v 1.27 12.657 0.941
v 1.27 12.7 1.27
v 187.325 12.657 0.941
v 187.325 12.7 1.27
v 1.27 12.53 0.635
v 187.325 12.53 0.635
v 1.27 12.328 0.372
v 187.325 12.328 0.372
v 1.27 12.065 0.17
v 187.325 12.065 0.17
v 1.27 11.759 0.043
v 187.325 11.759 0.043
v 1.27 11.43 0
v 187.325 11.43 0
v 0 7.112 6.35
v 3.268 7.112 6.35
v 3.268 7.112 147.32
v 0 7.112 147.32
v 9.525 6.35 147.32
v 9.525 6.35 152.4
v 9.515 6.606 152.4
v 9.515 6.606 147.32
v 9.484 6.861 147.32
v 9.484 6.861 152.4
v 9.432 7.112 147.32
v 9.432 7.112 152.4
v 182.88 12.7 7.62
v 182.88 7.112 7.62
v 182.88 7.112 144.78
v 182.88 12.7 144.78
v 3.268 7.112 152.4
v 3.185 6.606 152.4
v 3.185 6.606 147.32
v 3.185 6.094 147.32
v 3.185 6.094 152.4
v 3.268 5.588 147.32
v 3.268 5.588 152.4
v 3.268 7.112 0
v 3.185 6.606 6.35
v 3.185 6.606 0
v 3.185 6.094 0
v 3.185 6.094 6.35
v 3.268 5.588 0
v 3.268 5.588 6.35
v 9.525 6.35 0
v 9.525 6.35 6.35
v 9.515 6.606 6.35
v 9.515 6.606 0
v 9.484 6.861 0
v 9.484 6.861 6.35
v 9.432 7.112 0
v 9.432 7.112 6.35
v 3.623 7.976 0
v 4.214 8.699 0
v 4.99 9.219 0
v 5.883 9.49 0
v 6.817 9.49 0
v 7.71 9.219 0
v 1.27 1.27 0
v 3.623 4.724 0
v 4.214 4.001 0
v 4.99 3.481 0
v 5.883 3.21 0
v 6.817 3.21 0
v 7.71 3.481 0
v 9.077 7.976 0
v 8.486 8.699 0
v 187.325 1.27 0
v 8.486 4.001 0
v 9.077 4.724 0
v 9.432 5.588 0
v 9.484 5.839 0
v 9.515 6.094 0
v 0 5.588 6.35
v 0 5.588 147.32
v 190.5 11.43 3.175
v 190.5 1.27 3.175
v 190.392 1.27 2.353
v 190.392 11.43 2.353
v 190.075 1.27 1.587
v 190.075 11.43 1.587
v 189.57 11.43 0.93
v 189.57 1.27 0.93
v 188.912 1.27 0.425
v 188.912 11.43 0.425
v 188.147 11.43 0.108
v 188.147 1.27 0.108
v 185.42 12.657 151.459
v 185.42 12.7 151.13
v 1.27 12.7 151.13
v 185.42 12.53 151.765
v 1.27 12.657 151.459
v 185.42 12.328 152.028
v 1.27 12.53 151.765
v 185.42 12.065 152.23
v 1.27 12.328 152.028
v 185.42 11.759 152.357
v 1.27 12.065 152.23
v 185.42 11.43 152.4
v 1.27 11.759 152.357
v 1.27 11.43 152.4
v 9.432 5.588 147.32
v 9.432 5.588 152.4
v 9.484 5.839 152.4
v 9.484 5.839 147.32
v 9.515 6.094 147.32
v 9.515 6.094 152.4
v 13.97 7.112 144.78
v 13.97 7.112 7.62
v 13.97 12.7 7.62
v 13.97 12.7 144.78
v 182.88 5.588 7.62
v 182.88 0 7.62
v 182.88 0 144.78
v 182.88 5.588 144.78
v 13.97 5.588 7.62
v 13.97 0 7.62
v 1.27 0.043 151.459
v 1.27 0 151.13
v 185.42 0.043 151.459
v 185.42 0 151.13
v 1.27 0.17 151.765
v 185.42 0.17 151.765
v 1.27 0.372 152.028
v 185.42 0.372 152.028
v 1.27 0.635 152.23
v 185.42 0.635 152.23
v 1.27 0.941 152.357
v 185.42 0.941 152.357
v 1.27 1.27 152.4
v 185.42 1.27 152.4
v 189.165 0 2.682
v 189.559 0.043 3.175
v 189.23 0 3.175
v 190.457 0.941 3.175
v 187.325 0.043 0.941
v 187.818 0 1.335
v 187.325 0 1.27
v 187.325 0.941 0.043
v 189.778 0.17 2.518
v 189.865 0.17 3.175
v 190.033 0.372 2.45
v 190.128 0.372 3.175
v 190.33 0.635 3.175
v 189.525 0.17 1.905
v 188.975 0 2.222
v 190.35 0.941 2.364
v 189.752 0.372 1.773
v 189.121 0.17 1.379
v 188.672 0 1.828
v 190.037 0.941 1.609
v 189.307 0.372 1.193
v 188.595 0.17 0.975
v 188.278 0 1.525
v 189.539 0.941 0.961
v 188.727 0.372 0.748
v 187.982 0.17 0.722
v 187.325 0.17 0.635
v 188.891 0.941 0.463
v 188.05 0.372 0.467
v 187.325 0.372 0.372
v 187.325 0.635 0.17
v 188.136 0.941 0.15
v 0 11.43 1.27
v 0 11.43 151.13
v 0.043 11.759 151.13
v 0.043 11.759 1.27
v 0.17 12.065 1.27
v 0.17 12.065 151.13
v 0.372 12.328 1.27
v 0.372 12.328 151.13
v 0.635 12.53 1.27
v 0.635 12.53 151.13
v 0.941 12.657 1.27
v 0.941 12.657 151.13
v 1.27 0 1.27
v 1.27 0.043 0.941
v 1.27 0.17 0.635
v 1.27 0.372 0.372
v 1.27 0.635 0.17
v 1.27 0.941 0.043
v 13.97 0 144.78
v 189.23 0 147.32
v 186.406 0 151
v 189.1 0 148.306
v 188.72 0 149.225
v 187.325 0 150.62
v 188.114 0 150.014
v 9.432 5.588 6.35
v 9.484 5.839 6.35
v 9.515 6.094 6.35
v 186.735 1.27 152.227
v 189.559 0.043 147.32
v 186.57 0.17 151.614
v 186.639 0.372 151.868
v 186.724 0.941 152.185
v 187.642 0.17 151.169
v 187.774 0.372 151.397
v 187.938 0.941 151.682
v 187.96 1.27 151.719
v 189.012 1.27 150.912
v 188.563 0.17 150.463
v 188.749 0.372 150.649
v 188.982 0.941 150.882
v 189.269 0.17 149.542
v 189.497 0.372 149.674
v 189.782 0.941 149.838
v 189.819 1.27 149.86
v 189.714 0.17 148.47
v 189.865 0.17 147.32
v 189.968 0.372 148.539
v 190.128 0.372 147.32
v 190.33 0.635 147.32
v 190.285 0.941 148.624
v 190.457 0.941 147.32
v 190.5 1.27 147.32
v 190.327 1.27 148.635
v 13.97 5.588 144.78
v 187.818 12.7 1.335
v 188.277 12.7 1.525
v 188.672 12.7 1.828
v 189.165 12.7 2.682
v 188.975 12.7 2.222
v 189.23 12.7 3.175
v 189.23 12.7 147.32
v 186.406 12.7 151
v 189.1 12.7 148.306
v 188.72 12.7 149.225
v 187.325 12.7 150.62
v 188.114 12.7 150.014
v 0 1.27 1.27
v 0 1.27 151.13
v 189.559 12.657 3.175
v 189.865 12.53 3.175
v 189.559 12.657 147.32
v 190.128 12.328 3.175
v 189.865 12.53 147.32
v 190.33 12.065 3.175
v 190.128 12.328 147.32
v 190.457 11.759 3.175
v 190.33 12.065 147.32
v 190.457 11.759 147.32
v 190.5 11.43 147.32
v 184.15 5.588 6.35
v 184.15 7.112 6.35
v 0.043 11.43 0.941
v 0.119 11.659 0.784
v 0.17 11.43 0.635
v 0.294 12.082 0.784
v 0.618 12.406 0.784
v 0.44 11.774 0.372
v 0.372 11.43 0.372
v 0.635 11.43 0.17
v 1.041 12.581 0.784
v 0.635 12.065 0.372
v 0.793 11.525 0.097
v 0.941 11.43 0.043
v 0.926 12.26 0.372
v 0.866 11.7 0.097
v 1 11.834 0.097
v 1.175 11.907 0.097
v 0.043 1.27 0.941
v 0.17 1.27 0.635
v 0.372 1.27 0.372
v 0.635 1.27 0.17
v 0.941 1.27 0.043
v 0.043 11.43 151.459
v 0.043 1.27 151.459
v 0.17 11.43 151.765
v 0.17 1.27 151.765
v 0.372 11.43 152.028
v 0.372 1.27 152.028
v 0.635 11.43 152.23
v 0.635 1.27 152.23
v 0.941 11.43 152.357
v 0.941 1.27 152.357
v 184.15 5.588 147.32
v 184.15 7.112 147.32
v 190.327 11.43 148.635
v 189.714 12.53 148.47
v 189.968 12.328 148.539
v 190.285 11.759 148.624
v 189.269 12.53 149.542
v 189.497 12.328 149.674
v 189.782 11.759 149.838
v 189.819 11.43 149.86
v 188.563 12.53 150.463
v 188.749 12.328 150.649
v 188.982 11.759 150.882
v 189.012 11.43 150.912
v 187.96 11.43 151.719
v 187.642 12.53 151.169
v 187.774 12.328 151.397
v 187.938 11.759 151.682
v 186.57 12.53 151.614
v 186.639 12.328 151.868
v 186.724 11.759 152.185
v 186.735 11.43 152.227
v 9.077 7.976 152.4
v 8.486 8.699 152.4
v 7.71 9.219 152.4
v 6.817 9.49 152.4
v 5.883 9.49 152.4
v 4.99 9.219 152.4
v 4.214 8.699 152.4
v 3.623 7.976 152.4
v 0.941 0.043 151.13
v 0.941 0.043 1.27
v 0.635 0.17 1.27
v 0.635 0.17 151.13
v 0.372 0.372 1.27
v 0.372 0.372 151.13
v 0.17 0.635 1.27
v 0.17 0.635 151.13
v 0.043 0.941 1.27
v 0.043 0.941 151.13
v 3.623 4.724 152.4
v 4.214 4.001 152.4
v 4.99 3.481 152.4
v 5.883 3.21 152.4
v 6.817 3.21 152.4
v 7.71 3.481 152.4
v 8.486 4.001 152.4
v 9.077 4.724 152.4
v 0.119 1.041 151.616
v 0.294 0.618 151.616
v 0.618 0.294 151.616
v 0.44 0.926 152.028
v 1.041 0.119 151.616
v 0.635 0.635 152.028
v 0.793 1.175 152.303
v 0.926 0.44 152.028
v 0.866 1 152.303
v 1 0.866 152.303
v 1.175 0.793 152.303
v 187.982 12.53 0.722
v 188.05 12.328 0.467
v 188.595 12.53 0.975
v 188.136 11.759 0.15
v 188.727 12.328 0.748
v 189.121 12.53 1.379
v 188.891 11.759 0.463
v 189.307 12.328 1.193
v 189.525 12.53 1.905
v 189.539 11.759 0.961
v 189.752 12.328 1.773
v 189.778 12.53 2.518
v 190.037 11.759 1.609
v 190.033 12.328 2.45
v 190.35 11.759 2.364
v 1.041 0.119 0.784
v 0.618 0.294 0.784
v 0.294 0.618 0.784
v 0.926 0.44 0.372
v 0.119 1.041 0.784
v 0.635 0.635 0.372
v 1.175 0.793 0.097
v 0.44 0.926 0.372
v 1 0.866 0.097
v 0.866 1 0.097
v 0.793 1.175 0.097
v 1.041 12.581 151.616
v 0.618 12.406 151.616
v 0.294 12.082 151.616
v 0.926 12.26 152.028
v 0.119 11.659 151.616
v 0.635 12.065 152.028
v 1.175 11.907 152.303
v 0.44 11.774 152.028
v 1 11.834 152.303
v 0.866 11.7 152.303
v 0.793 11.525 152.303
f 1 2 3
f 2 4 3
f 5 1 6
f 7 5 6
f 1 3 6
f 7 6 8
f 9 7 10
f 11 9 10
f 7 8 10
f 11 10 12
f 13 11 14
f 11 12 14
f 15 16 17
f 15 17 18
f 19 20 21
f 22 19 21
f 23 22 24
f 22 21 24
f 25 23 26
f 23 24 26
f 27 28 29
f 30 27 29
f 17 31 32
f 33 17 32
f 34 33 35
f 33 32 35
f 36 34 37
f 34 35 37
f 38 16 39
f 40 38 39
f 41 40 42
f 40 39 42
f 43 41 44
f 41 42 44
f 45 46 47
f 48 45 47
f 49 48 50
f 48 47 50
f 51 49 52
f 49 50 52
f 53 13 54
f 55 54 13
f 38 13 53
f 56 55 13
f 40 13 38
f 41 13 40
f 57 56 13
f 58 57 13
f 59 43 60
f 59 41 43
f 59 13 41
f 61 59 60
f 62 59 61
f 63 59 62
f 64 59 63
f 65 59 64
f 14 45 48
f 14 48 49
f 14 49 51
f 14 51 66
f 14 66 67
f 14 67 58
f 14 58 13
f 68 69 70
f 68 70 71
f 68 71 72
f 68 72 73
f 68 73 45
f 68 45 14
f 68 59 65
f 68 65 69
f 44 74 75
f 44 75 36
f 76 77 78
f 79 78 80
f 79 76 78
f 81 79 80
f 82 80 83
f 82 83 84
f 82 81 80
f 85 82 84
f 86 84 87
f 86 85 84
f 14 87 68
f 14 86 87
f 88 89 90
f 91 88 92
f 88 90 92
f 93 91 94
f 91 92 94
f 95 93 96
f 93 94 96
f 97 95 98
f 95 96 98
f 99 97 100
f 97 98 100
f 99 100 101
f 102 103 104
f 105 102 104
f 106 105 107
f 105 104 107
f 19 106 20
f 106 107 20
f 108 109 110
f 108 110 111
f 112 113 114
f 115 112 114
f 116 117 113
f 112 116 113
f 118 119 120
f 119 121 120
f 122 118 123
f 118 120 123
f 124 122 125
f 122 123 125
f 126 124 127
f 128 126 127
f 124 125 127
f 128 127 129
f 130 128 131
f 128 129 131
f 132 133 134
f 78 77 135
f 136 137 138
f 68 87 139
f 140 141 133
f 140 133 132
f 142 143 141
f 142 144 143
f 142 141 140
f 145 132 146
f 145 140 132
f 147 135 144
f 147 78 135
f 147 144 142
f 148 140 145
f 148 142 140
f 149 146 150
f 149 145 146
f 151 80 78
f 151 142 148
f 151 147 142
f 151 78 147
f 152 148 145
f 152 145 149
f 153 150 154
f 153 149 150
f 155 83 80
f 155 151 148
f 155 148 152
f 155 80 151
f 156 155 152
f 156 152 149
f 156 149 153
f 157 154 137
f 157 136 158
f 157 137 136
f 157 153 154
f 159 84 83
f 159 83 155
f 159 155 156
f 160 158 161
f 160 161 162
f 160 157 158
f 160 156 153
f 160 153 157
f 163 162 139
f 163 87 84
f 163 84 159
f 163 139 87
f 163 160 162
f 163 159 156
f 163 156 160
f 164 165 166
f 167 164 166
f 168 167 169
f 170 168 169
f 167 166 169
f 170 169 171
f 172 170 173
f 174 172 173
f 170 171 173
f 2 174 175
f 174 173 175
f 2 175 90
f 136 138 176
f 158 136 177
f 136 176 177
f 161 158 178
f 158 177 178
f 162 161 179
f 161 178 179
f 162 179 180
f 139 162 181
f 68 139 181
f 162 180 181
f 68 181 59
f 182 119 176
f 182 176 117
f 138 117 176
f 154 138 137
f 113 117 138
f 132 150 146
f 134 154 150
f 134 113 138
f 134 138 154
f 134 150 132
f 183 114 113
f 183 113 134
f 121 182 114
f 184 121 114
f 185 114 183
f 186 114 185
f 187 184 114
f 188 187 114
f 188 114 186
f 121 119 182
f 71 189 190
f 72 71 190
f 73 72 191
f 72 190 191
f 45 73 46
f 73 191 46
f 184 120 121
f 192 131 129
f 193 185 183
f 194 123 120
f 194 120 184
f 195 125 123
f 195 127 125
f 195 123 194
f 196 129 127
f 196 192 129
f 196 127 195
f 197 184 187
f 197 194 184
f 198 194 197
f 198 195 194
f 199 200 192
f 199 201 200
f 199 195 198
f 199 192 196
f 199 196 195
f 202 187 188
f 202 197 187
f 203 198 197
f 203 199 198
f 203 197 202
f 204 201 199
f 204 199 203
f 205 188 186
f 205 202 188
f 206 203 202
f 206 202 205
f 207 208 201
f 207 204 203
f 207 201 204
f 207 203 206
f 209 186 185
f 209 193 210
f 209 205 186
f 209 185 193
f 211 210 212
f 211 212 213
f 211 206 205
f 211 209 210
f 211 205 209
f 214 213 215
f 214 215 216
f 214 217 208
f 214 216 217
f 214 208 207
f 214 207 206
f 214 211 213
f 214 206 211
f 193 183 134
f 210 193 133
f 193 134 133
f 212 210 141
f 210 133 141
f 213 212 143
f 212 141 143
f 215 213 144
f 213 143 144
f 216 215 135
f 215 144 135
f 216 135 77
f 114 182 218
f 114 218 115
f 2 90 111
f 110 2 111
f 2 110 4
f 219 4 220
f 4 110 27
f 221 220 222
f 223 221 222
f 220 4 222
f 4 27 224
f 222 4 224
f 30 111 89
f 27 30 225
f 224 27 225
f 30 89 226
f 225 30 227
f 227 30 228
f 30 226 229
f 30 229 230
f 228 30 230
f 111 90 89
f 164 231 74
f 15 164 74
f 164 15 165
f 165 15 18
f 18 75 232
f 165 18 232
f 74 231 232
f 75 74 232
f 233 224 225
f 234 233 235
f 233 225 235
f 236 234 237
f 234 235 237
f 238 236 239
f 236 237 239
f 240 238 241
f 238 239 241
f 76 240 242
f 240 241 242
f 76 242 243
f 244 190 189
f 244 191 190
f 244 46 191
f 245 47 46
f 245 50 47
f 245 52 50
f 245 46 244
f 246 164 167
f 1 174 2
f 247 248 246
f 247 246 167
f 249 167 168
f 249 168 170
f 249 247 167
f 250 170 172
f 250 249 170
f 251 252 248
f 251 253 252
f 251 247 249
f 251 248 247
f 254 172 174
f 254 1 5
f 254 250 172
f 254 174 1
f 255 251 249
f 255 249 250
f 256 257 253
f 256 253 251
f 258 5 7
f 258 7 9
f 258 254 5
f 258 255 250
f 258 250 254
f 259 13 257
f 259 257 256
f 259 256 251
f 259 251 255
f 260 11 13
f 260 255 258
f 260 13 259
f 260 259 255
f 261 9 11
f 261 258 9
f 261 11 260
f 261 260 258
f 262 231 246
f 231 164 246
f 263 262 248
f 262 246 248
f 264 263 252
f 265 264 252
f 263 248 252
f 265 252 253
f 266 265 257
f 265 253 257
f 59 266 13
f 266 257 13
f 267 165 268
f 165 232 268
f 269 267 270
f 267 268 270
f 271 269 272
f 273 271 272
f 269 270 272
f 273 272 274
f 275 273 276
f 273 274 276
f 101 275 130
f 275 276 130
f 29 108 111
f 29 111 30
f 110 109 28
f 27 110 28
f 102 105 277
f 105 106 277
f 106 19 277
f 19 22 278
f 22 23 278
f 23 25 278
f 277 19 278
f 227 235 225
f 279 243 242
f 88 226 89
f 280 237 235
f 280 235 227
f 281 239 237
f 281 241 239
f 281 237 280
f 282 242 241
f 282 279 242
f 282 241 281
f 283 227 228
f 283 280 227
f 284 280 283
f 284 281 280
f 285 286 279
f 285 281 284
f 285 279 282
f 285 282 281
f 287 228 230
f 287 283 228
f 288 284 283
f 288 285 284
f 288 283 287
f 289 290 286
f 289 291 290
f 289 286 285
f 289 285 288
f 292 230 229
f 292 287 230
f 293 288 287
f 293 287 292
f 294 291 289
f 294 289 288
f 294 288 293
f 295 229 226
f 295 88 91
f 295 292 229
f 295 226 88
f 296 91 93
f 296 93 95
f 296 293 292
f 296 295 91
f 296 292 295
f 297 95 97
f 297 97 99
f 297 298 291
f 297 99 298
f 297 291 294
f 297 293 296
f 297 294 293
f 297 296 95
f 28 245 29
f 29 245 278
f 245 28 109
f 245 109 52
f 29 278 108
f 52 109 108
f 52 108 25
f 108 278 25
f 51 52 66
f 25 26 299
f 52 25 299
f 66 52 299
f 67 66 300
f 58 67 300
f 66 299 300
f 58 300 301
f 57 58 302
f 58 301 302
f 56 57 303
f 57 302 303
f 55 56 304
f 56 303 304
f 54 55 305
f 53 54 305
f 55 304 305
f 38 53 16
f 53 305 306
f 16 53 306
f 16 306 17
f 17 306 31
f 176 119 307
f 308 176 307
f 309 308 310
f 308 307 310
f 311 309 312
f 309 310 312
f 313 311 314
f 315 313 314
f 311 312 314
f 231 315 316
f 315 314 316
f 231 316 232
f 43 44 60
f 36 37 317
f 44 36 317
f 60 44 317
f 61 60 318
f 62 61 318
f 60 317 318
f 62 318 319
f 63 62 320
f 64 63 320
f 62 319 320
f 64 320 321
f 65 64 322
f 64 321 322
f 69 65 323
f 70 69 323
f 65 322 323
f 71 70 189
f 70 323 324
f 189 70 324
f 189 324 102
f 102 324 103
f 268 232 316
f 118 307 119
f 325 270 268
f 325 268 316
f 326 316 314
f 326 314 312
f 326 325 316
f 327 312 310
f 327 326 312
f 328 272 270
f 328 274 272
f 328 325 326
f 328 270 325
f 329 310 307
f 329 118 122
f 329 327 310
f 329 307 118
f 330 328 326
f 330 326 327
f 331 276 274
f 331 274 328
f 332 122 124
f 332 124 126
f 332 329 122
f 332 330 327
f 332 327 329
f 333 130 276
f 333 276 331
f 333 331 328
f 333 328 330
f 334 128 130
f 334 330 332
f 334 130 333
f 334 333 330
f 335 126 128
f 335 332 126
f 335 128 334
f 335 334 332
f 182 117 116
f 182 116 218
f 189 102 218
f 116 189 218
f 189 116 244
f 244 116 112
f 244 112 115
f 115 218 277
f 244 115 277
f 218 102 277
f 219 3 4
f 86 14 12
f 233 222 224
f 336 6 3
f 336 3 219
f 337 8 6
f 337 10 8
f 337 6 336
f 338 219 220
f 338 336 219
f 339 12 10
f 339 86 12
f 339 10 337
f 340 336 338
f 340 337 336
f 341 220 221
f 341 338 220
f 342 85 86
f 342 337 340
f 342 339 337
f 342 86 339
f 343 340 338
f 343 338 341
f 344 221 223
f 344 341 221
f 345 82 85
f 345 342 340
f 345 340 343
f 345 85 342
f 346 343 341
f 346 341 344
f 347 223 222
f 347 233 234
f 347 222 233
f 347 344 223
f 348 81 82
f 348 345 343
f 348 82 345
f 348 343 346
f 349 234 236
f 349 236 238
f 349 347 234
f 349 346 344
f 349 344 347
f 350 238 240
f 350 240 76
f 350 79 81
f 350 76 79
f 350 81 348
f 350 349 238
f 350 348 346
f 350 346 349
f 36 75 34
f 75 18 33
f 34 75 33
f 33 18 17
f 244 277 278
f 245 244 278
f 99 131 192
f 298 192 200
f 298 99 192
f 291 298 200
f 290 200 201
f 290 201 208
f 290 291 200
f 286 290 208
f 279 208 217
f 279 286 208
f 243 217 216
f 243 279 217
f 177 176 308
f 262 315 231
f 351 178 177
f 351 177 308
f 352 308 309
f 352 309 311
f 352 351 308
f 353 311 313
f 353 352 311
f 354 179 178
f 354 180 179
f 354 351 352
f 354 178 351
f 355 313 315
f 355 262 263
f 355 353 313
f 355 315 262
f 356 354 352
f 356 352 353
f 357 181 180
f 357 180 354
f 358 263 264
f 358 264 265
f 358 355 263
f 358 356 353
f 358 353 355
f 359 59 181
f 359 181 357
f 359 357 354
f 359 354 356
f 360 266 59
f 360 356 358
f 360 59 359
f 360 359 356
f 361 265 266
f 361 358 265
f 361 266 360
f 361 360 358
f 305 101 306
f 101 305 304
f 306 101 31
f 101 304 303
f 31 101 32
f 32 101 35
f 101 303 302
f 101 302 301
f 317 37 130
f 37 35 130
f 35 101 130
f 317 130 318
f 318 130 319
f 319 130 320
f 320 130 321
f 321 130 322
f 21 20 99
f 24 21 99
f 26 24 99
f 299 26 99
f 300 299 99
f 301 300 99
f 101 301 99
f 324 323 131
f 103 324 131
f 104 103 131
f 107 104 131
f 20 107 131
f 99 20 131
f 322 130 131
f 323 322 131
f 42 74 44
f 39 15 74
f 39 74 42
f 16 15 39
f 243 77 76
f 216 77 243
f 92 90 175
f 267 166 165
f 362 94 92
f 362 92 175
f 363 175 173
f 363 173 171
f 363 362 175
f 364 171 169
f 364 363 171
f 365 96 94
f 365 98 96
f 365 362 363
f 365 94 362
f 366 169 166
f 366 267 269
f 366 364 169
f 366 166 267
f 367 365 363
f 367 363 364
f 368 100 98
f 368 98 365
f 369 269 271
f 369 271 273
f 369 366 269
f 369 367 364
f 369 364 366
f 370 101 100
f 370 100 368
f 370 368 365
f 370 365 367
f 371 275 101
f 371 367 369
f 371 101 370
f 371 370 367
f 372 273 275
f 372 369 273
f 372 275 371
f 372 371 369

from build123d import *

# Parameters (mm, degrees)
F0_W     = 190.5
F0_H     = 152.4
F0_W_2   = 168.91
F0_H_2   = 137.16
F1_DEPTH = 12.7
F3_R     = 5.08
F4_R     = 3.175
F5_R     = 1.27
F6_R     = 1.27
F7_START = -5.08
F2_W     = 69.85
F2_H     = 1.524
F7_DEPTH = 140.97
F8_DEPTH = 152.401


with BuildPart() as f1:
    # F0 (on Front) → F1 (new body)
    with BuildSketch(Plane.XZ):
        with Locations((95.25, 76.2)):
            Rectangle(F0_W, F0_H)
        with Locations((98.425, 76.2)):
            Rectangle(F0_W_2, F0_H_2, mode=Mode.SUBTRACT)
    extrude(amount=-F1_DEPTH)

    # F3
    f3_edges = [f1.edges().sort_by_distance(p)[0] for p in [
        (190.5, 6.35, 152.4),
    ]]
    fillet(f3_edges, radius=F3_R)

    # F4
    f4_edges = [f1.edges().sort_by_distance(p)[0] for p in [
        (190.5, 6.35, 0),
    ]]
    fillet(f4_edges, radius=F4_R)

    # F5
    f5_edges = [f1.edges().sort_by_distance(p)[0] for p in [
        (0, 0, 76.2),
        (0, 12.7, 76.2),
    ]]
    fillet(f5_edges, radius=F5_R)

    # F6
    f6_edges = [f1.edges().sort_by_distance(p)[0] for p in [
        (93.345, 0, 152.4),
        (1.27, 0, 76.2),
    ]]
    fillet(f6_edges, radius=F6_R)

    # F2 (on face) → F7 (cut)
    with BuildSketch(Plane.XY.offset(152.4).offset(F7_START)):
        with Locations((-34.925, 6.35)):
            Rectangle(F2_W, F2_H)
        with BuildLine():
            ThreePointArc((3.2677960807, 5.588), (3.175, 6.35), (3.2677960807, 7.112))
            Line((3.2677960807, 7.112), (0, 7.112))
            Line((0, 7.112), (0, 5.588))
            Line((0, 5.588), (3.2677960807, 5.588))
        make_face()
        with BuildLine():
            ThreePointArc((9.4322039193, 5.588), (9.5017155998, 5.9661852294), (9.525, 6.35))
            ThreePointArc((9.525, 6.35), (9.5017155998, 6.7338147706), (9.4322039193, 7.112))
            Line((9.4322039193, 7.112), (3.2677960807, 7.112))
            ThreePointArc((3.2677960807, 7.112), (3.175, 6.35), (3.2677960807, 5.588))
            Line((3.2677960807, 5.588), (9.4322039193, 5.588))
        make_face()
        with BuildLine():
            ThreePointArc((9.4322039193, 7.112), (9.5017155998, 6.7338147706), (9.525, 6.35))
            ThreePointArc((9.525, 6.35), (9.5017155998, 5.9661852294), (9.4322039193, 5.588))
            Line((9.4322039193, 5.588), (184.15, 5.588))
            Line((184.15, 5.588), (184.15, 7.112))
            Line((184.15, 7.112), (9.4322039193, 7.112))
        make_face()
    extrude(amount=-F7_DEPTH, mode=Mode.SUBTRACT)

    # F2 (on face) → F8 (cut, through all)
    with BuildSketch(Plane.XY.offset(152.4)):
        with BuildLine():
            ThreePointArc((9.4322039193, 5.588), (9.5017155998, 5.9661852294), (9.525, 6.35))
            ThreePointArc((9.525, 6.35), (9.5017155998, 6.7338147706), (9.4322039193, 7.112))
            Line((9.4322039193, 7.112), (3.2677960807, 7.112))
            ThreePointArc((3.2677960807, 7.112), (3.175, 6.35), (3.2677960807, 5.588))
            Line((3.2677960807, 5.588), (9.4322039193, 5.588))
        make_face()
        with BuildLine():
            ThreePointArc((3.2677960807, 5.588), (6.35, 3.175), (9.4322039193, 5.588))
            Line((9.4322039193, 5.588), (3.2677960807, 5.588))
        make_face()
        with BuildLine():
            Line((3.2677960807, 7.112), (9.4322039193, 7.112))
            ThreePointArc((9.4322039193, 7.112), (6.35, 9.525), (3.2677960807, 7.112))
        make_face()
    extrude(amount=-F8_DEPTH, mode=Mode.SUBTRACT)


solid = f1.part
